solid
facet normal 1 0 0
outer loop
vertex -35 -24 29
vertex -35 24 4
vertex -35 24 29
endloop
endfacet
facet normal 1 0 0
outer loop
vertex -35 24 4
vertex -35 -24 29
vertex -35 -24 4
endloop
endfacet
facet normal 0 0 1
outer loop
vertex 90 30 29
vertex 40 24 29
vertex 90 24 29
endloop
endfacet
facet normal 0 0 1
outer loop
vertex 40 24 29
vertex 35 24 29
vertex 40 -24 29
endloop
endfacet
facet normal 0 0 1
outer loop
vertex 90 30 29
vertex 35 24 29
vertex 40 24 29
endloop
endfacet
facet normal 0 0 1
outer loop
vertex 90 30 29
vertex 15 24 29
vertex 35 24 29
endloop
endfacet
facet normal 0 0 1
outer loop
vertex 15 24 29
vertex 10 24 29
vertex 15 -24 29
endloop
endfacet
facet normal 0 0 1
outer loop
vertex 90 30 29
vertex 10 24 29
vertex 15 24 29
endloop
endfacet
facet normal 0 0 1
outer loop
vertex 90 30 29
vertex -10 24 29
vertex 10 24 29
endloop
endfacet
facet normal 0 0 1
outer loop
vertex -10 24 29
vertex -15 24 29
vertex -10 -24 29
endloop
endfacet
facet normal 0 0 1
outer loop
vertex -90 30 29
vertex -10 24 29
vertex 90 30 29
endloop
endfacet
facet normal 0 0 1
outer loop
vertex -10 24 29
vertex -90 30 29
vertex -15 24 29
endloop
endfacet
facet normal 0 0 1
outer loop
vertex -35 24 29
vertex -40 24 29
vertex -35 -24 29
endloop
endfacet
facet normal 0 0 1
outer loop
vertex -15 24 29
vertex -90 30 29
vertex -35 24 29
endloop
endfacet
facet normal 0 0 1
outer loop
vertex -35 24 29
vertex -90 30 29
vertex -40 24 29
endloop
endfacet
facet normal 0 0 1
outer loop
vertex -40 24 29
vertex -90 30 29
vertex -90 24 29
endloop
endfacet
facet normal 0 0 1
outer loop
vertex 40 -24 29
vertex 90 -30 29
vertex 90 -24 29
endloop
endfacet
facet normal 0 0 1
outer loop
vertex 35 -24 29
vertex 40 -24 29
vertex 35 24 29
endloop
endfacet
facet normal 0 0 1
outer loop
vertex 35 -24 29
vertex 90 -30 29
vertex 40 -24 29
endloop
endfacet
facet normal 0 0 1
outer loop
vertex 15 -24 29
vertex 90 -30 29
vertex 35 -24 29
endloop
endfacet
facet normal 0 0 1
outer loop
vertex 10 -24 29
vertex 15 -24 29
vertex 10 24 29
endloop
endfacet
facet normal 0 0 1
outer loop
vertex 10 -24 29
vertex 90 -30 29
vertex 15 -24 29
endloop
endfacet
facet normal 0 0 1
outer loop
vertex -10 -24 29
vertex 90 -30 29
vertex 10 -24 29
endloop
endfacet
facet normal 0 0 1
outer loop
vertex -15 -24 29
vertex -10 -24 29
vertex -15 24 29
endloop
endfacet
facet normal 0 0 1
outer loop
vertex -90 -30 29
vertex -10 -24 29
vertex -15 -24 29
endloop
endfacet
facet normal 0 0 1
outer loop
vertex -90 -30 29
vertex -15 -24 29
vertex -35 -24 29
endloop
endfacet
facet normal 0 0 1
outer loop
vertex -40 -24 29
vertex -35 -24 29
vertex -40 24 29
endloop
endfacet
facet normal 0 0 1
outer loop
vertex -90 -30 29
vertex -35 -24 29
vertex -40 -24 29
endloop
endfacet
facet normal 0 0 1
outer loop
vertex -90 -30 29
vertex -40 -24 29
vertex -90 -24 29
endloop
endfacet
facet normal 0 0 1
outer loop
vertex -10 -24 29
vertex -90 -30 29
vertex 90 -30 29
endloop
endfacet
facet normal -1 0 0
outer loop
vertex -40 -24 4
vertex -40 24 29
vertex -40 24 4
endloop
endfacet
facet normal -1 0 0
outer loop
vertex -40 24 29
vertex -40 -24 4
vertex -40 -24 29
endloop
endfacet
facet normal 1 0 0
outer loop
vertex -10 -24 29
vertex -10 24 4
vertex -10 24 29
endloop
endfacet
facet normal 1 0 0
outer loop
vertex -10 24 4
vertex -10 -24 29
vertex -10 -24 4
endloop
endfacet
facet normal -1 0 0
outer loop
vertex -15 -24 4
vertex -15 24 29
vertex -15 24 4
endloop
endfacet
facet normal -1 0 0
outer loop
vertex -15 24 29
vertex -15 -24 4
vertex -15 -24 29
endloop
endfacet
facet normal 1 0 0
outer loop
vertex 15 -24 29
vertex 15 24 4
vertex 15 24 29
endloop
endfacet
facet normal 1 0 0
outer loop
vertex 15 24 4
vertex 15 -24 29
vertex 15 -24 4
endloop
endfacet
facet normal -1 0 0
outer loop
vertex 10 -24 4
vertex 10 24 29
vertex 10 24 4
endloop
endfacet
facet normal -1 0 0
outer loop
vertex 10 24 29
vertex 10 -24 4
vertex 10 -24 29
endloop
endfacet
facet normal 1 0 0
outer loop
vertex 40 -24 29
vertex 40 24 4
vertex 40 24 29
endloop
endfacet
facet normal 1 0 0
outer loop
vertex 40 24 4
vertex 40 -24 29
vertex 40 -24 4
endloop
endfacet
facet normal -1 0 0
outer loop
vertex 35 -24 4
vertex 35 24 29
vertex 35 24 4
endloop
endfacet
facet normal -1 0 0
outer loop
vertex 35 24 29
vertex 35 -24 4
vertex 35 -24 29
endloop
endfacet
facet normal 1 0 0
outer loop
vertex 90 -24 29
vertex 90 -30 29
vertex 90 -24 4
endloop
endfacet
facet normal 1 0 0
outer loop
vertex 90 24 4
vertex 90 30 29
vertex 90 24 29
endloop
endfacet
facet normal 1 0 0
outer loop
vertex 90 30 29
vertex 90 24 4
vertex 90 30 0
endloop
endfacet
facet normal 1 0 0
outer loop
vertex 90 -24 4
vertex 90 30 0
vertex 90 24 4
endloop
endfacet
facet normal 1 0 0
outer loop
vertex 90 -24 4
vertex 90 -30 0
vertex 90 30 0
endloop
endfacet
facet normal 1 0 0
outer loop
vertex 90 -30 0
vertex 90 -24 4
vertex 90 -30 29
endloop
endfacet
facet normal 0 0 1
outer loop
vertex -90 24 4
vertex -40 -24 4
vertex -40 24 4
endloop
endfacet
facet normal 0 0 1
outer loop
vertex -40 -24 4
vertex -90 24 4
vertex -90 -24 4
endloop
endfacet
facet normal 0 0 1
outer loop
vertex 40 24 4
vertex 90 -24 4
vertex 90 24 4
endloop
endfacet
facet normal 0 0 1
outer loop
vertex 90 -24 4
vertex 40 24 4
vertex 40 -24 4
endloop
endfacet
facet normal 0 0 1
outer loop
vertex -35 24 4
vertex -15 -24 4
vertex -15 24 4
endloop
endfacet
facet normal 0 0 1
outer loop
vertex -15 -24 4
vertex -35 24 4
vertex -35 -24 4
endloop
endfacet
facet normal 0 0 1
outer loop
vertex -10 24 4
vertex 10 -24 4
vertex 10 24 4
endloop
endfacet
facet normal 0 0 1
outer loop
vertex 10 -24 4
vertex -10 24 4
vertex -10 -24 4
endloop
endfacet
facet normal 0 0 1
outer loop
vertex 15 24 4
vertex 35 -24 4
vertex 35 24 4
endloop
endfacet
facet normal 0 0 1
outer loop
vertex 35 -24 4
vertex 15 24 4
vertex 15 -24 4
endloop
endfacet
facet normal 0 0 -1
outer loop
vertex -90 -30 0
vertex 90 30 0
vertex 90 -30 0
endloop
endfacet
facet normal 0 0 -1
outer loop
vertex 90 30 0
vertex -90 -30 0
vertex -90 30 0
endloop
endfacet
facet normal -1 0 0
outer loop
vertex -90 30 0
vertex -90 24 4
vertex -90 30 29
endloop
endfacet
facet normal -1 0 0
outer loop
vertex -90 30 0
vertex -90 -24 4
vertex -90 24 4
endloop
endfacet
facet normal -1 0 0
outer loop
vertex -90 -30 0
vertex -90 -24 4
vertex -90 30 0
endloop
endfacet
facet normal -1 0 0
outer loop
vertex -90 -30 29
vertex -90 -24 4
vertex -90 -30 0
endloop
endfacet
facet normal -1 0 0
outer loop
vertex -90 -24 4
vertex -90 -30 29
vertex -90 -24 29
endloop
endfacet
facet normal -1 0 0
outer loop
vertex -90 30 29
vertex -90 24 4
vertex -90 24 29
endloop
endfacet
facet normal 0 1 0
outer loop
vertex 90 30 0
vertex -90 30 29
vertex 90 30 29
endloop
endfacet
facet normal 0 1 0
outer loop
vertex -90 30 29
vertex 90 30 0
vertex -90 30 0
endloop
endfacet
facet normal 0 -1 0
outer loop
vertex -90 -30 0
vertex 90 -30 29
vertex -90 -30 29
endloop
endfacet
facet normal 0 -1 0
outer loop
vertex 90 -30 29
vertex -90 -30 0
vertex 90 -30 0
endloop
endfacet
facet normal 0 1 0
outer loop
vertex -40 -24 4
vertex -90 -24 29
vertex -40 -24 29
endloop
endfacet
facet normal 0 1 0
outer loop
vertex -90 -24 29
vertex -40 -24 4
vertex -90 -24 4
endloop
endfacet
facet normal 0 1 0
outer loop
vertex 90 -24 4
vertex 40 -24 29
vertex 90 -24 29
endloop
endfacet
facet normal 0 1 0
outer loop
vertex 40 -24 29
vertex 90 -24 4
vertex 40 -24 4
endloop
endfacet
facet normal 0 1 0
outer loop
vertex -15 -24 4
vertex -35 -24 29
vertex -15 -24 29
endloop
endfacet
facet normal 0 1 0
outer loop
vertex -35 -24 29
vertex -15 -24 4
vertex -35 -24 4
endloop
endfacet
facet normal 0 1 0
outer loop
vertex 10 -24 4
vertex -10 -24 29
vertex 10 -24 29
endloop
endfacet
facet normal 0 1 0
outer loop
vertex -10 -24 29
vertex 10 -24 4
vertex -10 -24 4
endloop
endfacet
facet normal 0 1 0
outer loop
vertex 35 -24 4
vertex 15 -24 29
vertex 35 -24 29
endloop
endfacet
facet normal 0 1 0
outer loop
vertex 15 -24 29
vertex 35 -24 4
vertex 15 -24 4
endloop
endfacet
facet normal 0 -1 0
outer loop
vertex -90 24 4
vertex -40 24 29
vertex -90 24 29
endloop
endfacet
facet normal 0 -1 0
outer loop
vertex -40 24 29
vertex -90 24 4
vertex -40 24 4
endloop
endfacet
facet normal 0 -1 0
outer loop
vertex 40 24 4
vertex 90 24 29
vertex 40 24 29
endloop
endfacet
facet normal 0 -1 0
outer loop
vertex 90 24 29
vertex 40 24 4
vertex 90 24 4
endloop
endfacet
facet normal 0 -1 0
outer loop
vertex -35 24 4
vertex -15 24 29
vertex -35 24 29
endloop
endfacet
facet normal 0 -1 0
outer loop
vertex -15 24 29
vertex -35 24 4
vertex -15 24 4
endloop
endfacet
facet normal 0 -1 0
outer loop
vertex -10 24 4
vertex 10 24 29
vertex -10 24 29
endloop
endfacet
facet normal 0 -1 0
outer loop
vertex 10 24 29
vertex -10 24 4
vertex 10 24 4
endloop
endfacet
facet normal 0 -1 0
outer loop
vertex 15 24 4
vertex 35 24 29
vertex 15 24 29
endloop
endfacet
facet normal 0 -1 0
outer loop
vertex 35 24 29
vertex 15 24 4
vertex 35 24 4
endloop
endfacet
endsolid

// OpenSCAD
$fn = 32;

// ----------------------------------------------------------------------
// Rib frame 180 x 60 x 29
// 4 ribs at 25 mm pitch
// ----------------------------------------------------------------------

// --- parameters (mm) ---
frame = [180, 60, 4];  // base plate size (x, y, z)
rail_w = 6;            // side rail width
ribs = 4;              // number of ribs
rib_t = 5;             // rib thickness
rib_h = 25;            // rib height above the base plate
pitch = 25;            // pitch between rib centres

// --- derived feature positions (mm) ---
span = (ribs - 1) * pitch;          // = 75   distance between the outer ribs
origin_x = -span / 2;               // = -37.5   X of the first rib
rib_len = frame[1] - 2 * rail_w + 2;  // = 50   rib length, 1 mm into each rail
feature_centers = [
  [origin_x + 0 * pitch, 0],
  [origin_x + 1 * pitch, 0],
  [origin_x + 2 * pitch, 0],
  [origin_x + 3 * pitch, 0]
];   // rib centre line, drives the rib loop

// base plate, two side rails, then the ribs read straight off feature_centers
union() {
  translate([-frame[0] / 2, -frame[1] / 2, 0]) cube(frame);
  translate([-frame[0] / 2, -frame[1] / 2, 0]) cube([frame[0], rail_w, frame[2] + rib_h]);
  translate([-frame[0] / 2, frame[1] / 2 - rail_w, 0]) cube([frame[0], rail_w, frame[2] + rib_h]);
  for (centre = feature_centers)
    translate([centre[0] - rib_t / 2, centre[1] - rib_len / 2, frame[2] - 1])
      cube([rib_t, rib_len, rib_h + 1]);
}
